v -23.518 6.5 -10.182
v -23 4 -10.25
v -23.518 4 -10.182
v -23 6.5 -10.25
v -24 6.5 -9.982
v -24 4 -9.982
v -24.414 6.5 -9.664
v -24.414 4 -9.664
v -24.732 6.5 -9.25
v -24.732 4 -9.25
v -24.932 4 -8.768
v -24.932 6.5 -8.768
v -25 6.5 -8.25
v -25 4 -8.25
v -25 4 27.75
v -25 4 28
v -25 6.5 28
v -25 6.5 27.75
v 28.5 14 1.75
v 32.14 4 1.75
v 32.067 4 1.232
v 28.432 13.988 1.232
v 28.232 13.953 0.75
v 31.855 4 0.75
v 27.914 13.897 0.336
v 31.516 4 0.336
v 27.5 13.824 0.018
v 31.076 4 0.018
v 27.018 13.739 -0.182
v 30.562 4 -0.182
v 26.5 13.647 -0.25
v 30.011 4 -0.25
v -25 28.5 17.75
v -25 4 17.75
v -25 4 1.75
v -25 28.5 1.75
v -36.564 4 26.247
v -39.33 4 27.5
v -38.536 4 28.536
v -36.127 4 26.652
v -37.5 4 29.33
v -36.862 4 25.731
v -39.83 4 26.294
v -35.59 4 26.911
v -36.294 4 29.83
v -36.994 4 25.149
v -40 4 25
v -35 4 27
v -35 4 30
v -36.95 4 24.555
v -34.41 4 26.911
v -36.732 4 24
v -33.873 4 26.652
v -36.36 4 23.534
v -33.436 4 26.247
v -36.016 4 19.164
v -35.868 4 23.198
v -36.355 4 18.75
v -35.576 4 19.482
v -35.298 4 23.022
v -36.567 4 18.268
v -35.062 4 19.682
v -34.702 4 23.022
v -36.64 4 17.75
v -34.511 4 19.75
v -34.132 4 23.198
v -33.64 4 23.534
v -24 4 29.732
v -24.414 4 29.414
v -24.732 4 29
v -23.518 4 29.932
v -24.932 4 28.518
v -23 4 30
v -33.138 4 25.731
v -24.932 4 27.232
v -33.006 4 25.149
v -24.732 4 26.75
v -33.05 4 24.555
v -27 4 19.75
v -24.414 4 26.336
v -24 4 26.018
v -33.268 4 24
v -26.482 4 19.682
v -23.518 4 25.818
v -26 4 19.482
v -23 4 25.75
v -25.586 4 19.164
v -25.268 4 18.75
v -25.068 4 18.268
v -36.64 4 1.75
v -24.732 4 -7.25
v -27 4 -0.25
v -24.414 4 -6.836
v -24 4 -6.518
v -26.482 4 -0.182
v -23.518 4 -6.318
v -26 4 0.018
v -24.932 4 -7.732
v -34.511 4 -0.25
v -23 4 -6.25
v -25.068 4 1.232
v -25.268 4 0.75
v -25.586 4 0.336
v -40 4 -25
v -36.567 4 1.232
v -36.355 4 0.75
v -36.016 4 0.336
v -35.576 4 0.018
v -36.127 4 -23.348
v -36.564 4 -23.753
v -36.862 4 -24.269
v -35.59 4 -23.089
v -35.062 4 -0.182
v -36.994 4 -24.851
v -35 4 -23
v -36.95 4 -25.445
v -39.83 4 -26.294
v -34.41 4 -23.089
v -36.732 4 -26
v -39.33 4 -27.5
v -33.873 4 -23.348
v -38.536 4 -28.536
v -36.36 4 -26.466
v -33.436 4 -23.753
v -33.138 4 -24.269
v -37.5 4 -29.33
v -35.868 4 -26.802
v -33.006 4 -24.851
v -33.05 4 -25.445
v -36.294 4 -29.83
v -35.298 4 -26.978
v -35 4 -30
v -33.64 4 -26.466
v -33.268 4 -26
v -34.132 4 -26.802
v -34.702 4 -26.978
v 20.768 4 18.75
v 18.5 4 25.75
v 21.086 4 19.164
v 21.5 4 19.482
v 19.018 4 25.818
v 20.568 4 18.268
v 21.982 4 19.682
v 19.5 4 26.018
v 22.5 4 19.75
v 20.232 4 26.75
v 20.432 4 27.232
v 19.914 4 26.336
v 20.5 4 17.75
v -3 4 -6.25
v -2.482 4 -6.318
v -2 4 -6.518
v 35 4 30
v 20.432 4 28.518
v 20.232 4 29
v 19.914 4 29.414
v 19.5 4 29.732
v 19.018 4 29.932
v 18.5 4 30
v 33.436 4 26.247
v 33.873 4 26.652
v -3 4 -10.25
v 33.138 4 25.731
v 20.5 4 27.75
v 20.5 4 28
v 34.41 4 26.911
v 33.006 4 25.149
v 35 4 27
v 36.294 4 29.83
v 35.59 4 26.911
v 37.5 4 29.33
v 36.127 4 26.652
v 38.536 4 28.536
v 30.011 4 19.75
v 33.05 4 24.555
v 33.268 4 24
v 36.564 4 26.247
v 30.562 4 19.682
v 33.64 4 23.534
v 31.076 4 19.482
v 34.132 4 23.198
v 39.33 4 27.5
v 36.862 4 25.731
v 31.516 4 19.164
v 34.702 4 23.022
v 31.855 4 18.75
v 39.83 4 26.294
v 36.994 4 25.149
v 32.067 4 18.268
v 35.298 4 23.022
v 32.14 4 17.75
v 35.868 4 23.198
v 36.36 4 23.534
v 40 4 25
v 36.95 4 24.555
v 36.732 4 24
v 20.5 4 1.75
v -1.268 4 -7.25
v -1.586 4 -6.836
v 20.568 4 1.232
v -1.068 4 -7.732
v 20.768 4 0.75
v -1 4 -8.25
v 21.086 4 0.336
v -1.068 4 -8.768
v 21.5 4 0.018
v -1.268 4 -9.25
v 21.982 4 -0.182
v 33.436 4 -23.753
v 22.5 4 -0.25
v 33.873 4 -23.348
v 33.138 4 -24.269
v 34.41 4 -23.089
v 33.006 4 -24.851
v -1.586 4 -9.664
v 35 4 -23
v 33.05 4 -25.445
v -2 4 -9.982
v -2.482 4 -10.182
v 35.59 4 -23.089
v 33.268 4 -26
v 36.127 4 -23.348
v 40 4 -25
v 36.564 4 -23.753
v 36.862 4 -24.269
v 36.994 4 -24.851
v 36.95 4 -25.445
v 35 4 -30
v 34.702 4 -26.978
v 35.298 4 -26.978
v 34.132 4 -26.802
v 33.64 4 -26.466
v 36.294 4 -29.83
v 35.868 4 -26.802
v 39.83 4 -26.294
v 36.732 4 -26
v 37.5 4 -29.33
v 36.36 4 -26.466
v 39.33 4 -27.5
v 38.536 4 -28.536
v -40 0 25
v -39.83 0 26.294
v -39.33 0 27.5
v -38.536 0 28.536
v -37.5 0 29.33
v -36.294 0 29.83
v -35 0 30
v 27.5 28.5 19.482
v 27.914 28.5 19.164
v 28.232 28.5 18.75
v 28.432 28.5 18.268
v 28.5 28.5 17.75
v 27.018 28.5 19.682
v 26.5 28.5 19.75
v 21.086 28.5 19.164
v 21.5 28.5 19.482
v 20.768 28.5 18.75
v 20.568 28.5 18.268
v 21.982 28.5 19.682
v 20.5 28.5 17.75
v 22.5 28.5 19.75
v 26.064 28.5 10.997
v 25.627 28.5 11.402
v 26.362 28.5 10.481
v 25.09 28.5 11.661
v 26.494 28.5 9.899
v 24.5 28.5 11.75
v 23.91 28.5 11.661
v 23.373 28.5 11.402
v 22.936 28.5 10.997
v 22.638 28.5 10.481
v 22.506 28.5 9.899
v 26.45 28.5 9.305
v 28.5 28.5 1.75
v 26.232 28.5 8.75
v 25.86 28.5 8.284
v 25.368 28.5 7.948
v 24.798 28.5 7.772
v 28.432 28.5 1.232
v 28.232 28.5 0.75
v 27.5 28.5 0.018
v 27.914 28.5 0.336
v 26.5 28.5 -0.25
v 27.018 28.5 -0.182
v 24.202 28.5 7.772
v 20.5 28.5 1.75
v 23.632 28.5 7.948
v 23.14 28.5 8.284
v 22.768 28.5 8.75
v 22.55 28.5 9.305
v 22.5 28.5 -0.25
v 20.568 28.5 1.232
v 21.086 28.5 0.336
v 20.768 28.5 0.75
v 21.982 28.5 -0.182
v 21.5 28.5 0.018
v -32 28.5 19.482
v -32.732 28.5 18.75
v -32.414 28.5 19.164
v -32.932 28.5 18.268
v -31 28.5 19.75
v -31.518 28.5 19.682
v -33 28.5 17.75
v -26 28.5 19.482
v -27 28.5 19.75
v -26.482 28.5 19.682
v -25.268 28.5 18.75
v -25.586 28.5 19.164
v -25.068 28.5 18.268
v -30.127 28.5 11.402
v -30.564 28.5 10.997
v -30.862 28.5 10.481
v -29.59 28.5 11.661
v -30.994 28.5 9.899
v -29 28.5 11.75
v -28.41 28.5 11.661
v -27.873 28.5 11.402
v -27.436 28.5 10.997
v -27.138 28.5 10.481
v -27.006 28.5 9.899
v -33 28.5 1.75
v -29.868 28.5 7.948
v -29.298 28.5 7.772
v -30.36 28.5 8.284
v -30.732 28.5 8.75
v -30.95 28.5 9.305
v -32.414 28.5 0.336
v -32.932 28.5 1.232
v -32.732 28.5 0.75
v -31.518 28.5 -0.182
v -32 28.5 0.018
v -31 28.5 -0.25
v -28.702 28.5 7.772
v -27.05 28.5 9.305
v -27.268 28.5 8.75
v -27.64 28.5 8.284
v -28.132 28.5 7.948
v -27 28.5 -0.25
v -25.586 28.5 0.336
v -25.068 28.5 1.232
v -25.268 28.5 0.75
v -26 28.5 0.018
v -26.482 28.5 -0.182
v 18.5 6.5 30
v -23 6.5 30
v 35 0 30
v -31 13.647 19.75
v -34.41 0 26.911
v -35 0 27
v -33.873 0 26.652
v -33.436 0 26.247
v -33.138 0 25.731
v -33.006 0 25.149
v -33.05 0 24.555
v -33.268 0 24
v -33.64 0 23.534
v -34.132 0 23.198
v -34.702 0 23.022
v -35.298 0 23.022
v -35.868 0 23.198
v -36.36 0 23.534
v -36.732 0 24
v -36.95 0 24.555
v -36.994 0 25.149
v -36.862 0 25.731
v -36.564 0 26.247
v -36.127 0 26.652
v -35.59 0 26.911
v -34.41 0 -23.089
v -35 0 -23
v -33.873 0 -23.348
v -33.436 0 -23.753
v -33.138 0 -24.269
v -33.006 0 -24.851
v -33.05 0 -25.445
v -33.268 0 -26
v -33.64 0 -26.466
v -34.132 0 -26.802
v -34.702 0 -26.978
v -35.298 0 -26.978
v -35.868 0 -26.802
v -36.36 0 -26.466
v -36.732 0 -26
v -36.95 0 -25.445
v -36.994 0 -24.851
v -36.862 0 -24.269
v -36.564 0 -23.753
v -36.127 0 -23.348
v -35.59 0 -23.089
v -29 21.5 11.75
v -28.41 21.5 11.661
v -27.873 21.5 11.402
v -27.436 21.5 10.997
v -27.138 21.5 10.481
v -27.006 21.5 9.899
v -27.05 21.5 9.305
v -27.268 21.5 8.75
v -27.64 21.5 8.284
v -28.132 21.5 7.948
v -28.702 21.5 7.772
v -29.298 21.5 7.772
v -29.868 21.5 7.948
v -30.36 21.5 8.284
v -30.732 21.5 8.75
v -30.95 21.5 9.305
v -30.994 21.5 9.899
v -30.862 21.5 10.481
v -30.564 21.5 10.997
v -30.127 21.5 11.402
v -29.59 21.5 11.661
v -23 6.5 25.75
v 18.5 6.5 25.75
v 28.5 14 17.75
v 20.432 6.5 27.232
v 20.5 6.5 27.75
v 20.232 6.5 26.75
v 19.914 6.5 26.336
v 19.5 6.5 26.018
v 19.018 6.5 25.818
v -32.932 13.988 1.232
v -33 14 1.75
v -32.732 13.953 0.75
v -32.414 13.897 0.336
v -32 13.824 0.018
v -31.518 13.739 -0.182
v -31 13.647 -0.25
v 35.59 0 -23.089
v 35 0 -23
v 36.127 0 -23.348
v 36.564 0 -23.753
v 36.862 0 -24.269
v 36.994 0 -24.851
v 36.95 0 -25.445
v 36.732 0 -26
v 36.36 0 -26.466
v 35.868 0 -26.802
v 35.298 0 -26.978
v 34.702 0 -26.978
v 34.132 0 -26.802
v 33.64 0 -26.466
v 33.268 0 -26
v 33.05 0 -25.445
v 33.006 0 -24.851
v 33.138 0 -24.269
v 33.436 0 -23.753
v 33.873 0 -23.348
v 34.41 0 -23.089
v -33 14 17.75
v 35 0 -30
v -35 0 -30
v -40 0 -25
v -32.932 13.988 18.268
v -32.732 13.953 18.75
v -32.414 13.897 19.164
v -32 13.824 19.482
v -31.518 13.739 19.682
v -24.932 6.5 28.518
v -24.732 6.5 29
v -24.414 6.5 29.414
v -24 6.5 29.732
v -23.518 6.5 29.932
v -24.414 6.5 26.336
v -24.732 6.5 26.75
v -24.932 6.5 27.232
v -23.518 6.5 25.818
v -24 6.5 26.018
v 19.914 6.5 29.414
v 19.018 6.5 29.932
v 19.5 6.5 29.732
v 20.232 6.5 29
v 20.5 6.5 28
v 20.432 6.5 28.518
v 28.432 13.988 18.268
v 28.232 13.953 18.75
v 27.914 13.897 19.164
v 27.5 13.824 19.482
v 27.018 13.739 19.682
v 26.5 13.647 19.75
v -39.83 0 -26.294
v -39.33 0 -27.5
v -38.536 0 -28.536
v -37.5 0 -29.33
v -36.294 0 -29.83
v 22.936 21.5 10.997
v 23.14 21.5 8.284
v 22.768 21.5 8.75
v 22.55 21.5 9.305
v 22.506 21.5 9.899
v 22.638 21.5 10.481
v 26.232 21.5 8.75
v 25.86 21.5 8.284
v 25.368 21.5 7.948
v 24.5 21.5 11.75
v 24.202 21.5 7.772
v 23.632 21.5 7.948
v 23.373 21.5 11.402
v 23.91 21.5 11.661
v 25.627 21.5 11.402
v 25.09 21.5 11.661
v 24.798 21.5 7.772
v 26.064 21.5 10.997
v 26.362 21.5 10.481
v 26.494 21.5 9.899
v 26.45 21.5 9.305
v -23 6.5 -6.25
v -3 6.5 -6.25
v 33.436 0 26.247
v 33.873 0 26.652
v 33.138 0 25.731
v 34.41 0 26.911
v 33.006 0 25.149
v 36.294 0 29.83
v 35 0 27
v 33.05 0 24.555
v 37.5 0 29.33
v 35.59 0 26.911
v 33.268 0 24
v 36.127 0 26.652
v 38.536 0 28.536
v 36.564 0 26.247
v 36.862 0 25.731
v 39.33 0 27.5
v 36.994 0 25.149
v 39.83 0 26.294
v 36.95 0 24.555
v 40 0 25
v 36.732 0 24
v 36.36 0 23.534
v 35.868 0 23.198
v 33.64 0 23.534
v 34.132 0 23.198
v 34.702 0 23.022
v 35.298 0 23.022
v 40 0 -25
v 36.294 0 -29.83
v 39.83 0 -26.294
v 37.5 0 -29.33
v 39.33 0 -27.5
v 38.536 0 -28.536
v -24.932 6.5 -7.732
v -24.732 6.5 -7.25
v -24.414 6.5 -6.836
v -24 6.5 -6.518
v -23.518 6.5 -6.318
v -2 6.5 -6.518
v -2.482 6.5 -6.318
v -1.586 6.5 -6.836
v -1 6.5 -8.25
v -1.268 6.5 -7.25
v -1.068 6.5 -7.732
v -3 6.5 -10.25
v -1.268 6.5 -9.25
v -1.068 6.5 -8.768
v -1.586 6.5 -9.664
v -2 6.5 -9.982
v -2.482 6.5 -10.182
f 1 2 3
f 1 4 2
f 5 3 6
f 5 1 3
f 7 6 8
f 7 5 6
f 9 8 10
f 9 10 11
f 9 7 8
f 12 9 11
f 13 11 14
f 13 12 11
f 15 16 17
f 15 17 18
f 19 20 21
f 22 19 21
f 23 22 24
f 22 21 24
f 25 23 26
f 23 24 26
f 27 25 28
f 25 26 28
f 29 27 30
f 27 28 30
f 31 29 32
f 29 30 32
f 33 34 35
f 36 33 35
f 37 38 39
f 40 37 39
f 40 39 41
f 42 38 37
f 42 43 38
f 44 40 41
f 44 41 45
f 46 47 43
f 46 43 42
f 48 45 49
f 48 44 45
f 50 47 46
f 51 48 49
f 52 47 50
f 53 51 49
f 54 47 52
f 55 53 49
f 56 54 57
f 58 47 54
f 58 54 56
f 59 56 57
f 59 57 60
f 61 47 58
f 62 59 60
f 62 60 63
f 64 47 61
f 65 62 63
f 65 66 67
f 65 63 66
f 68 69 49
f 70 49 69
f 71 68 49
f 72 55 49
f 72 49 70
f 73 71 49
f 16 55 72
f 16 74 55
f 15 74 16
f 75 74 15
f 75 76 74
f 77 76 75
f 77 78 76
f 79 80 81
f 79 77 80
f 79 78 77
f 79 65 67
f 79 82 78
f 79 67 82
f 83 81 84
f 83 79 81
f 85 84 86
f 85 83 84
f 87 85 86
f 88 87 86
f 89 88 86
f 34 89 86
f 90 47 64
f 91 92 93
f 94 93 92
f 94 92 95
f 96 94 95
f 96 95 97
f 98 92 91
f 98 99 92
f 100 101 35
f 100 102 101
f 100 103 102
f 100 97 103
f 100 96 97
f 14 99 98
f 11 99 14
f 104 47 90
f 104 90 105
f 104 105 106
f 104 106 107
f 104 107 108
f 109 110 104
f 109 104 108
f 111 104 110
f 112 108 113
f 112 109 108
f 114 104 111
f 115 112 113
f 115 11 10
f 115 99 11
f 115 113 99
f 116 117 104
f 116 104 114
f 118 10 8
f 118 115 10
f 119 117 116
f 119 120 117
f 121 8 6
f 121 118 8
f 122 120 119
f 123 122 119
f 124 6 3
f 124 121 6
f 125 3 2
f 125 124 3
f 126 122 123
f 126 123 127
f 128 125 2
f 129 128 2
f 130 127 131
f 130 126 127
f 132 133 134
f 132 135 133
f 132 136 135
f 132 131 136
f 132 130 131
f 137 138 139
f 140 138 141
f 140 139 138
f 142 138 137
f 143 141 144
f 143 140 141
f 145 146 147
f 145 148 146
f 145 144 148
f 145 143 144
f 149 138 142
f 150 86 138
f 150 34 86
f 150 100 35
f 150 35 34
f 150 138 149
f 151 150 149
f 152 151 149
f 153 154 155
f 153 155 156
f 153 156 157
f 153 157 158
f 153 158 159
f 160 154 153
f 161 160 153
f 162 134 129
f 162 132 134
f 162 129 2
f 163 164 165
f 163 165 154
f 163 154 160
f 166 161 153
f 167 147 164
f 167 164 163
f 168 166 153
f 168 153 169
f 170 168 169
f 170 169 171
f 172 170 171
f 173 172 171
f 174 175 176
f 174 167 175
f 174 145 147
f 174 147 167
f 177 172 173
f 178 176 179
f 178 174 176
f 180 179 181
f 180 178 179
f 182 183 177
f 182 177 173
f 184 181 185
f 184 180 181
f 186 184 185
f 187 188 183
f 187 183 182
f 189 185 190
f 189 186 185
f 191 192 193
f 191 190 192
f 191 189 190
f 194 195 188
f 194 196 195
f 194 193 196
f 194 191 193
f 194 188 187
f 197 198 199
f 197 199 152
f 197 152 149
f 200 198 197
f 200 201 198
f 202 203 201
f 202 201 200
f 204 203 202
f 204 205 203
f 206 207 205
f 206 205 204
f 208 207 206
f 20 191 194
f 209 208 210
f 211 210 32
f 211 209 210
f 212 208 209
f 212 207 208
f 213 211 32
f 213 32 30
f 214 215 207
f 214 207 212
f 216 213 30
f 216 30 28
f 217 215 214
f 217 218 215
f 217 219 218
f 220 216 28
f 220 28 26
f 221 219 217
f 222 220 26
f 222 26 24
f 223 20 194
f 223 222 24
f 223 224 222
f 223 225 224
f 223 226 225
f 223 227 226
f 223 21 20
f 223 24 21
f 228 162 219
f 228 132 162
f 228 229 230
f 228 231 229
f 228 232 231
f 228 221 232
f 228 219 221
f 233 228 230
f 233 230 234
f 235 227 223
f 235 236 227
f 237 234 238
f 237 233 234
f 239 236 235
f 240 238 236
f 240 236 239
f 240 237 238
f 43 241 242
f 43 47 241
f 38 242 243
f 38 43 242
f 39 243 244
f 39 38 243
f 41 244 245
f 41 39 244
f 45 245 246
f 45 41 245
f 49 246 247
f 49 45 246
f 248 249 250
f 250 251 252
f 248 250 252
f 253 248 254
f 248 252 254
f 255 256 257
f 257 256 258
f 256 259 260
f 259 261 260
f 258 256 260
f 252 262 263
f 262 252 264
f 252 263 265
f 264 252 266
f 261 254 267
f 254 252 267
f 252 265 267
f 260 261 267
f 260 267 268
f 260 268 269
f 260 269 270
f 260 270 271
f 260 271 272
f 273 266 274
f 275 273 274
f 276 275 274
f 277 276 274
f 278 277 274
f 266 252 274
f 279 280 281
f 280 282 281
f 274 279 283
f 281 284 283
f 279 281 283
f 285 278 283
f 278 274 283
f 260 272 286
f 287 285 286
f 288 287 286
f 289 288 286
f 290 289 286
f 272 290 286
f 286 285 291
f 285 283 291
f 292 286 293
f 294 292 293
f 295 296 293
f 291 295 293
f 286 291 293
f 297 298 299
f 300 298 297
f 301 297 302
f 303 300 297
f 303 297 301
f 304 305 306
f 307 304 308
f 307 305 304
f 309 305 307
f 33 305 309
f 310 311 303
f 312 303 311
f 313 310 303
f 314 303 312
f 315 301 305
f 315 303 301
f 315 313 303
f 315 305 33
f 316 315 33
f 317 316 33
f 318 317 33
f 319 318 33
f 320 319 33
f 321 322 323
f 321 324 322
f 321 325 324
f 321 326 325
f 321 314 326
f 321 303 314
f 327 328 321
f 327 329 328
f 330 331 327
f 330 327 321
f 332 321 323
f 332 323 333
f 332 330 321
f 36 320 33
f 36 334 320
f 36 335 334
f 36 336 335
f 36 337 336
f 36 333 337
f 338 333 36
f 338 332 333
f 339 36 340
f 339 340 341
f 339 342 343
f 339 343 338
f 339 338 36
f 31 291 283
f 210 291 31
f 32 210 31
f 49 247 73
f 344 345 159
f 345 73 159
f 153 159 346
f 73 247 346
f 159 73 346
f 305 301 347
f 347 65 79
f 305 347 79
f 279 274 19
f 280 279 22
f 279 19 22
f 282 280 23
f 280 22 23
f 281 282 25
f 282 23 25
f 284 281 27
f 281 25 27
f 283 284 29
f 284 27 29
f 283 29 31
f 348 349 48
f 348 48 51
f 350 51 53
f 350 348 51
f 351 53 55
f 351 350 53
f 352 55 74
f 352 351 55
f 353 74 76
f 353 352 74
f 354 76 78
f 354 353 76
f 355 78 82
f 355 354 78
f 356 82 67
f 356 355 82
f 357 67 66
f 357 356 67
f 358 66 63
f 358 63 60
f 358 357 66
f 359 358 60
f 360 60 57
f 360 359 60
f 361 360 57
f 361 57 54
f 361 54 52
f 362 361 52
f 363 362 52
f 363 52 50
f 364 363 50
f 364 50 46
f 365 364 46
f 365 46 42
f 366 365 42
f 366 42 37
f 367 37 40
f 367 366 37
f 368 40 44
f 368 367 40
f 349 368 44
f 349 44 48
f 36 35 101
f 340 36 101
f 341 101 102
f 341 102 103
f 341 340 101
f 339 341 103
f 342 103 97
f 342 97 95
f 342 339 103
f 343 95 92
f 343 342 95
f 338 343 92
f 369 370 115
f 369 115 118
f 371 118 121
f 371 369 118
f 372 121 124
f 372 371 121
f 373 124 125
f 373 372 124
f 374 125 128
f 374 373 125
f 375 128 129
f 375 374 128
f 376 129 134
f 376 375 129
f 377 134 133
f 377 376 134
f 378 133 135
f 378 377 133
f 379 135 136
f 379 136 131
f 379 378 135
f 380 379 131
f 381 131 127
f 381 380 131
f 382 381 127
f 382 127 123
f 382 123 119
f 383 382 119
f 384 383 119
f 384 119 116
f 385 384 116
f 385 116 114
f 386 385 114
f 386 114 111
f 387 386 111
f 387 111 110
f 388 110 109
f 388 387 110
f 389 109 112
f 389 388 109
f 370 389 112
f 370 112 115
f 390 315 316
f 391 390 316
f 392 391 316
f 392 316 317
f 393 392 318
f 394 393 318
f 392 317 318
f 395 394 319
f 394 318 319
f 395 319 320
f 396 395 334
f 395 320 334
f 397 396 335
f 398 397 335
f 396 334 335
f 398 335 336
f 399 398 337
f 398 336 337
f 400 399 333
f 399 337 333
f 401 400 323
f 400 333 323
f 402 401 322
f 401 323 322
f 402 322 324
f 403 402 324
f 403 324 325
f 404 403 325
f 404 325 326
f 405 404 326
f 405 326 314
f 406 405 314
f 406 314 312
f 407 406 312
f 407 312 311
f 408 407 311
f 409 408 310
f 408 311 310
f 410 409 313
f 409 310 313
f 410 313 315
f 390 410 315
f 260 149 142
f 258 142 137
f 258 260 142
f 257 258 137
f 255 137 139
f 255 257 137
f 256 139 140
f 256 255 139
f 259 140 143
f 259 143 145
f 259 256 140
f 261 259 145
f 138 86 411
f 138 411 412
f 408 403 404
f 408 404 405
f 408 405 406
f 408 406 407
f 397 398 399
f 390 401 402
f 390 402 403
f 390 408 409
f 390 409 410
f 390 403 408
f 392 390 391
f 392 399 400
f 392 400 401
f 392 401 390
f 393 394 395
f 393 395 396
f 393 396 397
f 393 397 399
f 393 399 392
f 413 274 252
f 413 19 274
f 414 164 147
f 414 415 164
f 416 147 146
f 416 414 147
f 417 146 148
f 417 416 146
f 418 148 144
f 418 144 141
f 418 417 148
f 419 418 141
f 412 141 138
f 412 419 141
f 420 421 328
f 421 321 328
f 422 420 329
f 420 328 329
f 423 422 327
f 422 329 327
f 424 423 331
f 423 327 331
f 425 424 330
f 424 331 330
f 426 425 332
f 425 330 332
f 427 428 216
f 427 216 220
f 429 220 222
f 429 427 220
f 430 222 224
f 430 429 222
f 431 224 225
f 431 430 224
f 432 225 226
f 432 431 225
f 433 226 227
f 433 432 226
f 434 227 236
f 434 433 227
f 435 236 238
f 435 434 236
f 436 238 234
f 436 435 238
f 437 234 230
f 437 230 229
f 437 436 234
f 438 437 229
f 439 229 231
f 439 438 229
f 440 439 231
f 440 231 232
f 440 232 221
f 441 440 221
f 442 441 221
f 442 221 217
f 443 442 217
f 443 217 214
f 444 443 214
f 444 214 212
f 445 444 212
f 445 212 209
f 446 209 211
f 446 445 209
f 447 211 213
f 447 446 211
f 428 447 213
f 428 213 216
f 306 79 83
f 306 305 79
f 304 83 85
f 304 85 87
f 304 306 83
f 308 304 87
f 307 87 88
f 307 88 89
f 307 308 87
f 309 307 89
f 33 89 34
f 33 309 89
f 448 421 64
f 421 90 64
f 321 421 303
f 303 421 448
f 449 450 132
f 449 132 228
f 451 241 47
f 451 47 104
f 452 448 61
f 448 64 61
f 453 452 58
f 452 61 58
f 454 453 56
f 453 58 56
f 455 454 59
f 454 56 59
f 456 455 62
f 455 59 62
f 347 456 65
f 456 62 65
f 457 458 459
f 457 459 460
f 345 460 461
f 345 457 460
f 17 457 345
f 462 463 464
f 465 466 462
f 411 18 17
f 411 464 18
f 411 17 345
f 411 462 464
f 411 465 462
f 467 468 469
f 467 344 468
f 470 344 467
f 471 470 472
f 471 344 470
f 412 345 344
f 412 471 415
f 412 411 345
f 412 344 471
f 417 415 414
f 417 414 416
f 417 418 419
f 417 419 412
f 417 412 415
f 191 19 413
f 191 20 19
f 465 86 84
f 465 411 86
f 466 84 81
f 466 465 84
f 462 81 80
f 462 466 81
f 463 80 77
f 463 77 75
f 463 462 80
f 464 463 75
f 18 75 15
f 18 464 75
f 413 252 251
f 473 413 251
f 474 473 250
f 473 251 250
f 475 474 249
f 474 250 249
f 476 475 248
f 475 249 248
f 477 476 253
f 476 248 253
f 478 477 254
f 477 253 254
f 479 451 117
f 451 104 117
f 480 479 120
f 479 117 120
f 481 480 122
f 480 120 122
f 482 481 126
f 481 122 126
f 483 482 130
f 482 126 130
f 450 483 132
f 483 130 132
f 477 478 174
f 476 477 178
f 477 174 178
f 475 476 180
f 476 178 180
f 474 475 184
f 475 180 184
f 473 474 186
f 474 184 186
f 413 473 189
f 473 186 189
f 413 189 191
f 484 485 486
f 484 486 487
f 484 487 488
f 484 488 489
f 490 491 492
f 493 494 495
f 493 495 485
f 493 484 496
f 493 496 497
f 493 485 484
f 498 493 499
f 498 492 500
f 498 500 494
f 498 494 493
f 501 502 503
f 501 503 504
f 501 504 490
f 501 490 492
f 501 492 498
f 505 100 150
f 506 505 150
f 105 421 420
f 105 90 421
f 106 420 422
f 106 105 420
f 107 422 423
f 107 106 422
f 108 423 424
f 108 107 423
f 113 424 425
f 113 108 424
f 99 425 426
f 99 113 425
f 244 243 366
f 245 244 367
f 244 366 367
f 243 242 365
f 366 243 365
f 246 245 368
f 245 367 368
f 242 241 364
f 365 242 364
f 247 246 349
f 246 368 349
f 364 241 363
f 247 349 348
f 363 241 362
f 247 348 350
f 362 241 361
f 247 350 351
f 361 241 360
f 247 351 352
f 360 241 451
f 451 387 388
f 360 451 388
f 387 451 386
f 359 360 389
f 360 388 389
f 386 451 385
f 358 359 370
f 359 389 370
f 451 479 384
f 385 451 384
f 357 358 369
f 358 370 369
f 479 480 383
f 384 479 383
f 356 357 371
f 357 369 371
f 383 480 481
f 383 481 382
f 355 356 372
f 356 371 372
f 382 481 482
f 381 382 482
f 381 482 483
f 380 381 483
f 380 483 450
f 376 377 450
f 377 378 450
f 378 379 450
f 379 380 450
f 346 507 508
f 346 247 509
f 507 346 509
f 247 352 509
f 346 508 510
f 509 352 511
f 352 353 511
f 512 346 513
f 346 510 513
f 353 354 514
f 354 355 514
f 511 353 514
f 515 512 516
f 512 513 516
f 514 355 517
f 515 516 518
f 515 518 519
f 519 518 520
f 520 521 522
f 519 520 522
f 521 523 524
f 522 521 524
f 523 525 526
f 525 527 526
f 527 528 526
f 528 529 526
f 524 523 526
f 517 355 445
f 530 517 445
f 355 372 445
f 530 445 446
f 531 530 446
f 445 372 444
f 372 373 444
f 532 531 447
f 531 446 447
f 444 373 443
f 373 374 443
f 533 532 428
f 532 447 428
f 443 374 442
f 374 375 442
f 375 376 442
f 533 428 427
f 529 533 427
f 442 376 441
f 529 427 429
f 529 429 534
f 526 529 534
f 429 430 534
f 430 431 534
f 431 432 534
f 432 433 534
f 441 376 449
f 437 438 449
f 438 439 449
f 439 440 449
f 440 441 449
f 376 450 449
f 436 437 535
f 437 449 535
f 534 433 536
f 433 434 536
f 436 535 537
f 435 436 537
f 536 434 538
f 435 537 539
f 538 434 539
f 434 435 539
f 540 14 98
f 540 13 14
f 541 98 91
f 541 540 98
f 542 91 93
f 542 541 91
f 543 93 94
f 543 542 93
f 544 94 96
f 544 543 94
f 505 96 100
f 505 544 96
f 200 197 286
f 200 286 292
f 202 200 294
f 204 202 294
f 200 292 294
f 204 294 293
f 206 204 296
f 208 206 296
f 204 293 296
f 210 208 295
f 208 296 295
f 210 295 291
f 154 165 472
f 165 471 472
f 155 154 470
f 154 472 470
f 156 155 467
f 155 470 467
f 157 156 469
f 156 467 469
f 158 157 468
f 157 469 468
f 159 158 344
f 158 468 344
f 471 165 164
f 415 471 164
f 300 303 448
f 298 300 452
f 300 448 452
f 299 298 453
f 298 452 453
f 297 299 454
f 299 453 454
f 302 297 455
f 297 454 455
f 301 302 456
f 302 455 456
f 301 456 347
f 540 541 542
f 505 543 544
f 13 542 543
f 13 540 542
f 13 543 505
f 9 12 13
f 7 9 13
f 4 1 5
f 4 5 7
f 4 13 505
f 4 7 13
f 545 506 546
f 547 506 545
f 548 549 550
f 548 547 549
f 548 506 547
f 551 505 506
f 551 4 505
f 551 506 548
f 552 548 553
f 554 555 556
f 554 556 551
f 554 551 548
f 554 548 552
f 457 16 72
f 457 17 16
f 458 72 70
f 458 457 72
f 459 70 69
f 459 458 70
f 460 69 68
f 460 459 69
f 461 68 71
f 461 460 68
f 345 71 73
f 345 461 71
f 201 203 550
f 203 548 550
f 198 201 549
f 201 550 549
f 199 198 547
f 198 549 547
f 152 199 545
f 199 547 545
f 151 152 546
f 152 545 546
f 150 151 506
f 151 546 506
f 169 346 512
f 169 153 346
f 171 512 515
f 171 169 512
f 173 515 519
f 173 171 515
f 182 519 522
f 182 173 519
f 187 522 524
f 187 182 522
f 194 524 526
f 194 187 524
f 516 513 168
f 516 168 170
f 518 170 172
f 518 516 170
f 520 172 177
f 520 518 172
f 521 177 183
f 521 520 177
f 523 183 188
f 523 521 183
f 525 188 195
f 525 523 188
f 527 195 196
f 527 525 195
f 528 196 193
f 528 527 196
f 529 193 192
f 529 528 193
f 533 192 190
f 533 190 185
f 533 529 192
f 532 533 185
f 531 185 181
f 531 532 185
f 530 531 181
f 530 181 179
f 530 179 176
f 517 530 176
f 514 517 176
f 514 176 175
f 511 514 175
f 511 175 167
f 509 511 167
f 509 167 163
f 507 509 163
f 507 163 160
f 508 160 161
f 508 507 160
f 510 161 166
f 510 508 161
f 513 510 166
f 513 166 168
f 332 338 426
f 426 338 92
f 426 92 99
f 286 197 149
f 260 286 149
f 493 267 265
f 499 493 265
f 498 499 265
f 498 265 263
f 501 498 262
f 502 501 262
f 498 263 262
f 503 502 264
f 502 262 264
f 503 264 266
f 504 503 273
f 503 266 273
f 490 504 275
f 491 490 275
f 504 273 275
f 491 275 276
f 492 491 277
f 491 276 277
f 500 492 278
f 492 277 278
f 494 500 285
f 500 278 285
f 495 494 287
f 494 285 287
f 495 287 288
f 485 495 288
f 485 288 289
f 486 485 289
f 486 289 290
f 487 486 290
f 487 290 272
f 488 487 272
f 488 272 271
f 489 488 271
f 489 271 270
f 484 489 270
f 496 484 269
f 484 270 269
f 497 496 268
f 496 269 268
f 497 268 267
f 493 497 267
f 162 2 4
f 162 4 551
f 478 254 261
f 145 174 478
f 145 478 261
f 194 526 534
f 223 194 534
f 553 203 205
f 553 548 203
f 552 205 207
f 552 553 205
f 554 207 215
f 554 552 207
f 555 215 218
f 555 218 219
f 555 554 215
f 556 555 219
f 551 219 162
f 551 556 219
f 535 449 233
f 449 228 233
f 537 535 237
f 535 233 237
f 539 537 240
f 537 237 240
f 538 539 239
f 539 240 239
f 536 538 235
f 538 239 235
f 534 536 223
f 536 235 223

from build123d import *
from OCP.BRepFilletAPI import BRepFilletAPI_MakeChamfer

# Parameters (mm, degrees)
SKETCH_1_W          = 80
SKETCH_1_H          = 60
SKETCH_1_R          = 2
EXTRUDE_1_DEPTH     = 4
FILLET_1_R          = 5
SKETCH_2_W          = 24
SKETCH_2_H          = 4
SKETCH_2_W_2        = 45.5
SKETCH_2_H_2        = 4.25
EXTRUDE_2_DEPTH     = 2.5
EXTRUDE_3_DEPTH     = 24.5
SKETCH_3_R          = 2
CUT_EXTRUDE_1_DEPTH = 7
CHAMFER_1_SIZE      = 10
CHAMFER_1_SIZE2     = 3.639702343
FILLET_2_R          = 2
FILLET_3_R          = 2
FILLET_4_R          = 2


with BuildPart() as part:
    # Эскиз1 → Бобышка-Вытянуть1 (new body)
    with BuildSketch(Plane(origin=(0, 0, 0), x_dir=(1, 0, 0), z_dir=(0, 1, 0))):
        Rectangle(SKETCH_1_W, SKETCH_1_H)
        with Locations(Location((-35, 25, 0), (0, 0, 270))):
            Circle(SKETCH_1_R, mode=Mode.SUBTRACT)
        with Locations(Location((35, 25, 0), (0, 0, 270))):
            Circle(SKETCH_1_R, mode=Mode.SUBTRACT)
        with Locations(Location((-35, -25, 0), (0, 0, 270))):
            Circle(SKETCH_1_R, mode=Mode.SUBTRACT)
        with Locations(Location((35, -25, 0), (0, 0, 270))):
            Circle(SKETCH_1_R, mode=Mode.SUBTRACT)
    extrude(amount=EXTRUDE_1_DEPTH)

    # Скругление1
    fillet_1_edges = [part.edges().sort_by_distance(p)[0] for p in [
        (40, 2, 30),
        (-40, 2, 30),
        (-40, 2, -30),
        (40, 2, -30),
    ]]
    fillet(fillet_1_edges, radius=FILLET_1_R)

    # Эскиз2 → Бобышка-Вытянуть2 (add)
    with BuildSketch(Plane(origin=(0, 4, 0), x_dir=(1, 0, 0), z_dir=(0, 1, 0))):
        with Locations((-13, 8.25)):
            Rectangle(SKETCH_2_W, SKETCH_2_H)
        with Locations((-2.25, -27.875)):
            Rectangle(SKETCH_2_W_2, SKETCH_2_H_2)
    extrude(amount=EXTRUDE_2_DEPTH)

    # Эскиз2<3> → Бобышка-Вытянуть3 (add)
    with BuildSketch(Plane(origin=(0, 4, 0), x_dir=(1, 0, 0), z_dir=(0, 1, 0))):
        Polygon((20.5, -19.75), (20.5, -9.75), (20.5, 0.25), (28.5, 0.25), (28.5, -19.75), align=None)
        Polygon((-25, -19.75), (-25, -9.75), (-25, 0.25), (-33, 0.25), (-33, -19.75), align=None)
    extrude(amount=EXTRUDE_3_DEPTH)

    # Эскиз3 → Вырез-Вытянуть1 (cut)
    with BuildSketch(Plane(origin=(0, 28.5, 0), x_dir=(1, 0, 0), z_dir=(0, 1, 0))):
        with Locations(Location((-29, -9.75, 0), (0, 0, 270))):
            Circle(SKETCH_3_R)
        with Locations(Location((24.5, -9.75, 0), (0, 0, 270))):
            Circle(SKETCH_3_R)
    extrude(amount=-CUT_EXTRUDE_1_DEPTH, mode=Mode.SUBTRACT)

    # Фаска1: one chamfer whose edges measure the first distance from different faces: ONE call of the kernel's chamfer builder (chamfer() names one face for all edges)
    chamfer_1_edges_1 = [part.edges().sort_by_distance(p)[0] for p in [
        (28.5, 4, 9.75),
    ]]
    chamfer_1_side_1 = [part.faces().sort_by_distance(p)[0] for p in [
        (28.5, 16.25, 9.75),
    ]]
    chamfer_1_edges_2 = [part.edges().sort_by_distance(p)[0] for p in [
        (-33, 4, 9.75),
    ]]
    chamfer_1_side_2 = [part.faces().sort_by_distance(p)[0] for p in [
        (-33, 16.25, 9.75),
    ]]
    chamfer_1 = BRepFilletAPI_MakeChamfer(part.part.solid().wrapped)
    for e in chamfer_1_edges_1:
        chamfer_1.Add(CHAMFER_1_SIZE, CHAMFER_1_SIZE2, e.wrapped, chamfer_1_side_1[0].wrapped)  # the first distance lies on this face
    for e in chamfer_1_edges_2:
        chamfer_1.Add(CHAMFER_1_SIZE, CHAMFER_1_SIZE2, e.wrapped, chamfer_1_side_2[0].wrapped)  # the first distance lies on this face
    add(Compound.cast(chamfer_1.Shape()), mode=Mode.REPLACE)

    # Скругление2
    fillet_2_edges = [part.edges().sort_by_distance(p)[0] for p in [
        (-34.819851171, 9, 19.75),
        (-34.819851171, 9, -0.25),
        (30.319851171, 9, 19.75),
        (30.319851171, 9, -0.25),
        (20.5, 16.25, -0.25),
        (20.5, 16.25, 19.75),
        (-25, 16.25, 19.75),
        (-25, 16.25, -0.25),
    ]]
    fillet(fillet_2_edges, radius=FILLET_2_R)

    # Скругление3
    fillet_3_edges = [part.edges().sort_by_distance(p)[0] for p in [
        (-25, 5.25, -6.25),
        (-1, 5.25, -10.25),
        (-25, 5.25, -10.25),
        (-1, 5.25, -6.25),
        (20.5, 5.25, 25.75),
        (20.5, 5.25, 30),
        (-25, 5.25, 30),
        (-25, 5.25, 25.75),
    ]]
    fillet(fillet_3_edges, radius=FILLET_3_R - 0.0001)  # a hair under: the kernel refuses the full size

    # Скругление4
    fillet_4_edges = [part.edges().sort_by_distance(p)[0] for p in [
        (28.5, 18.3261956, -0.25),
        (28.5, 18.3261956, 19.75),
        (-33, 18.3261956, -0.25),
        (-33, 18.3261956, 19.75),
    ]]
    fillet(fillet_4_edges, radius=FILLET_4_R)


solid = part.part
